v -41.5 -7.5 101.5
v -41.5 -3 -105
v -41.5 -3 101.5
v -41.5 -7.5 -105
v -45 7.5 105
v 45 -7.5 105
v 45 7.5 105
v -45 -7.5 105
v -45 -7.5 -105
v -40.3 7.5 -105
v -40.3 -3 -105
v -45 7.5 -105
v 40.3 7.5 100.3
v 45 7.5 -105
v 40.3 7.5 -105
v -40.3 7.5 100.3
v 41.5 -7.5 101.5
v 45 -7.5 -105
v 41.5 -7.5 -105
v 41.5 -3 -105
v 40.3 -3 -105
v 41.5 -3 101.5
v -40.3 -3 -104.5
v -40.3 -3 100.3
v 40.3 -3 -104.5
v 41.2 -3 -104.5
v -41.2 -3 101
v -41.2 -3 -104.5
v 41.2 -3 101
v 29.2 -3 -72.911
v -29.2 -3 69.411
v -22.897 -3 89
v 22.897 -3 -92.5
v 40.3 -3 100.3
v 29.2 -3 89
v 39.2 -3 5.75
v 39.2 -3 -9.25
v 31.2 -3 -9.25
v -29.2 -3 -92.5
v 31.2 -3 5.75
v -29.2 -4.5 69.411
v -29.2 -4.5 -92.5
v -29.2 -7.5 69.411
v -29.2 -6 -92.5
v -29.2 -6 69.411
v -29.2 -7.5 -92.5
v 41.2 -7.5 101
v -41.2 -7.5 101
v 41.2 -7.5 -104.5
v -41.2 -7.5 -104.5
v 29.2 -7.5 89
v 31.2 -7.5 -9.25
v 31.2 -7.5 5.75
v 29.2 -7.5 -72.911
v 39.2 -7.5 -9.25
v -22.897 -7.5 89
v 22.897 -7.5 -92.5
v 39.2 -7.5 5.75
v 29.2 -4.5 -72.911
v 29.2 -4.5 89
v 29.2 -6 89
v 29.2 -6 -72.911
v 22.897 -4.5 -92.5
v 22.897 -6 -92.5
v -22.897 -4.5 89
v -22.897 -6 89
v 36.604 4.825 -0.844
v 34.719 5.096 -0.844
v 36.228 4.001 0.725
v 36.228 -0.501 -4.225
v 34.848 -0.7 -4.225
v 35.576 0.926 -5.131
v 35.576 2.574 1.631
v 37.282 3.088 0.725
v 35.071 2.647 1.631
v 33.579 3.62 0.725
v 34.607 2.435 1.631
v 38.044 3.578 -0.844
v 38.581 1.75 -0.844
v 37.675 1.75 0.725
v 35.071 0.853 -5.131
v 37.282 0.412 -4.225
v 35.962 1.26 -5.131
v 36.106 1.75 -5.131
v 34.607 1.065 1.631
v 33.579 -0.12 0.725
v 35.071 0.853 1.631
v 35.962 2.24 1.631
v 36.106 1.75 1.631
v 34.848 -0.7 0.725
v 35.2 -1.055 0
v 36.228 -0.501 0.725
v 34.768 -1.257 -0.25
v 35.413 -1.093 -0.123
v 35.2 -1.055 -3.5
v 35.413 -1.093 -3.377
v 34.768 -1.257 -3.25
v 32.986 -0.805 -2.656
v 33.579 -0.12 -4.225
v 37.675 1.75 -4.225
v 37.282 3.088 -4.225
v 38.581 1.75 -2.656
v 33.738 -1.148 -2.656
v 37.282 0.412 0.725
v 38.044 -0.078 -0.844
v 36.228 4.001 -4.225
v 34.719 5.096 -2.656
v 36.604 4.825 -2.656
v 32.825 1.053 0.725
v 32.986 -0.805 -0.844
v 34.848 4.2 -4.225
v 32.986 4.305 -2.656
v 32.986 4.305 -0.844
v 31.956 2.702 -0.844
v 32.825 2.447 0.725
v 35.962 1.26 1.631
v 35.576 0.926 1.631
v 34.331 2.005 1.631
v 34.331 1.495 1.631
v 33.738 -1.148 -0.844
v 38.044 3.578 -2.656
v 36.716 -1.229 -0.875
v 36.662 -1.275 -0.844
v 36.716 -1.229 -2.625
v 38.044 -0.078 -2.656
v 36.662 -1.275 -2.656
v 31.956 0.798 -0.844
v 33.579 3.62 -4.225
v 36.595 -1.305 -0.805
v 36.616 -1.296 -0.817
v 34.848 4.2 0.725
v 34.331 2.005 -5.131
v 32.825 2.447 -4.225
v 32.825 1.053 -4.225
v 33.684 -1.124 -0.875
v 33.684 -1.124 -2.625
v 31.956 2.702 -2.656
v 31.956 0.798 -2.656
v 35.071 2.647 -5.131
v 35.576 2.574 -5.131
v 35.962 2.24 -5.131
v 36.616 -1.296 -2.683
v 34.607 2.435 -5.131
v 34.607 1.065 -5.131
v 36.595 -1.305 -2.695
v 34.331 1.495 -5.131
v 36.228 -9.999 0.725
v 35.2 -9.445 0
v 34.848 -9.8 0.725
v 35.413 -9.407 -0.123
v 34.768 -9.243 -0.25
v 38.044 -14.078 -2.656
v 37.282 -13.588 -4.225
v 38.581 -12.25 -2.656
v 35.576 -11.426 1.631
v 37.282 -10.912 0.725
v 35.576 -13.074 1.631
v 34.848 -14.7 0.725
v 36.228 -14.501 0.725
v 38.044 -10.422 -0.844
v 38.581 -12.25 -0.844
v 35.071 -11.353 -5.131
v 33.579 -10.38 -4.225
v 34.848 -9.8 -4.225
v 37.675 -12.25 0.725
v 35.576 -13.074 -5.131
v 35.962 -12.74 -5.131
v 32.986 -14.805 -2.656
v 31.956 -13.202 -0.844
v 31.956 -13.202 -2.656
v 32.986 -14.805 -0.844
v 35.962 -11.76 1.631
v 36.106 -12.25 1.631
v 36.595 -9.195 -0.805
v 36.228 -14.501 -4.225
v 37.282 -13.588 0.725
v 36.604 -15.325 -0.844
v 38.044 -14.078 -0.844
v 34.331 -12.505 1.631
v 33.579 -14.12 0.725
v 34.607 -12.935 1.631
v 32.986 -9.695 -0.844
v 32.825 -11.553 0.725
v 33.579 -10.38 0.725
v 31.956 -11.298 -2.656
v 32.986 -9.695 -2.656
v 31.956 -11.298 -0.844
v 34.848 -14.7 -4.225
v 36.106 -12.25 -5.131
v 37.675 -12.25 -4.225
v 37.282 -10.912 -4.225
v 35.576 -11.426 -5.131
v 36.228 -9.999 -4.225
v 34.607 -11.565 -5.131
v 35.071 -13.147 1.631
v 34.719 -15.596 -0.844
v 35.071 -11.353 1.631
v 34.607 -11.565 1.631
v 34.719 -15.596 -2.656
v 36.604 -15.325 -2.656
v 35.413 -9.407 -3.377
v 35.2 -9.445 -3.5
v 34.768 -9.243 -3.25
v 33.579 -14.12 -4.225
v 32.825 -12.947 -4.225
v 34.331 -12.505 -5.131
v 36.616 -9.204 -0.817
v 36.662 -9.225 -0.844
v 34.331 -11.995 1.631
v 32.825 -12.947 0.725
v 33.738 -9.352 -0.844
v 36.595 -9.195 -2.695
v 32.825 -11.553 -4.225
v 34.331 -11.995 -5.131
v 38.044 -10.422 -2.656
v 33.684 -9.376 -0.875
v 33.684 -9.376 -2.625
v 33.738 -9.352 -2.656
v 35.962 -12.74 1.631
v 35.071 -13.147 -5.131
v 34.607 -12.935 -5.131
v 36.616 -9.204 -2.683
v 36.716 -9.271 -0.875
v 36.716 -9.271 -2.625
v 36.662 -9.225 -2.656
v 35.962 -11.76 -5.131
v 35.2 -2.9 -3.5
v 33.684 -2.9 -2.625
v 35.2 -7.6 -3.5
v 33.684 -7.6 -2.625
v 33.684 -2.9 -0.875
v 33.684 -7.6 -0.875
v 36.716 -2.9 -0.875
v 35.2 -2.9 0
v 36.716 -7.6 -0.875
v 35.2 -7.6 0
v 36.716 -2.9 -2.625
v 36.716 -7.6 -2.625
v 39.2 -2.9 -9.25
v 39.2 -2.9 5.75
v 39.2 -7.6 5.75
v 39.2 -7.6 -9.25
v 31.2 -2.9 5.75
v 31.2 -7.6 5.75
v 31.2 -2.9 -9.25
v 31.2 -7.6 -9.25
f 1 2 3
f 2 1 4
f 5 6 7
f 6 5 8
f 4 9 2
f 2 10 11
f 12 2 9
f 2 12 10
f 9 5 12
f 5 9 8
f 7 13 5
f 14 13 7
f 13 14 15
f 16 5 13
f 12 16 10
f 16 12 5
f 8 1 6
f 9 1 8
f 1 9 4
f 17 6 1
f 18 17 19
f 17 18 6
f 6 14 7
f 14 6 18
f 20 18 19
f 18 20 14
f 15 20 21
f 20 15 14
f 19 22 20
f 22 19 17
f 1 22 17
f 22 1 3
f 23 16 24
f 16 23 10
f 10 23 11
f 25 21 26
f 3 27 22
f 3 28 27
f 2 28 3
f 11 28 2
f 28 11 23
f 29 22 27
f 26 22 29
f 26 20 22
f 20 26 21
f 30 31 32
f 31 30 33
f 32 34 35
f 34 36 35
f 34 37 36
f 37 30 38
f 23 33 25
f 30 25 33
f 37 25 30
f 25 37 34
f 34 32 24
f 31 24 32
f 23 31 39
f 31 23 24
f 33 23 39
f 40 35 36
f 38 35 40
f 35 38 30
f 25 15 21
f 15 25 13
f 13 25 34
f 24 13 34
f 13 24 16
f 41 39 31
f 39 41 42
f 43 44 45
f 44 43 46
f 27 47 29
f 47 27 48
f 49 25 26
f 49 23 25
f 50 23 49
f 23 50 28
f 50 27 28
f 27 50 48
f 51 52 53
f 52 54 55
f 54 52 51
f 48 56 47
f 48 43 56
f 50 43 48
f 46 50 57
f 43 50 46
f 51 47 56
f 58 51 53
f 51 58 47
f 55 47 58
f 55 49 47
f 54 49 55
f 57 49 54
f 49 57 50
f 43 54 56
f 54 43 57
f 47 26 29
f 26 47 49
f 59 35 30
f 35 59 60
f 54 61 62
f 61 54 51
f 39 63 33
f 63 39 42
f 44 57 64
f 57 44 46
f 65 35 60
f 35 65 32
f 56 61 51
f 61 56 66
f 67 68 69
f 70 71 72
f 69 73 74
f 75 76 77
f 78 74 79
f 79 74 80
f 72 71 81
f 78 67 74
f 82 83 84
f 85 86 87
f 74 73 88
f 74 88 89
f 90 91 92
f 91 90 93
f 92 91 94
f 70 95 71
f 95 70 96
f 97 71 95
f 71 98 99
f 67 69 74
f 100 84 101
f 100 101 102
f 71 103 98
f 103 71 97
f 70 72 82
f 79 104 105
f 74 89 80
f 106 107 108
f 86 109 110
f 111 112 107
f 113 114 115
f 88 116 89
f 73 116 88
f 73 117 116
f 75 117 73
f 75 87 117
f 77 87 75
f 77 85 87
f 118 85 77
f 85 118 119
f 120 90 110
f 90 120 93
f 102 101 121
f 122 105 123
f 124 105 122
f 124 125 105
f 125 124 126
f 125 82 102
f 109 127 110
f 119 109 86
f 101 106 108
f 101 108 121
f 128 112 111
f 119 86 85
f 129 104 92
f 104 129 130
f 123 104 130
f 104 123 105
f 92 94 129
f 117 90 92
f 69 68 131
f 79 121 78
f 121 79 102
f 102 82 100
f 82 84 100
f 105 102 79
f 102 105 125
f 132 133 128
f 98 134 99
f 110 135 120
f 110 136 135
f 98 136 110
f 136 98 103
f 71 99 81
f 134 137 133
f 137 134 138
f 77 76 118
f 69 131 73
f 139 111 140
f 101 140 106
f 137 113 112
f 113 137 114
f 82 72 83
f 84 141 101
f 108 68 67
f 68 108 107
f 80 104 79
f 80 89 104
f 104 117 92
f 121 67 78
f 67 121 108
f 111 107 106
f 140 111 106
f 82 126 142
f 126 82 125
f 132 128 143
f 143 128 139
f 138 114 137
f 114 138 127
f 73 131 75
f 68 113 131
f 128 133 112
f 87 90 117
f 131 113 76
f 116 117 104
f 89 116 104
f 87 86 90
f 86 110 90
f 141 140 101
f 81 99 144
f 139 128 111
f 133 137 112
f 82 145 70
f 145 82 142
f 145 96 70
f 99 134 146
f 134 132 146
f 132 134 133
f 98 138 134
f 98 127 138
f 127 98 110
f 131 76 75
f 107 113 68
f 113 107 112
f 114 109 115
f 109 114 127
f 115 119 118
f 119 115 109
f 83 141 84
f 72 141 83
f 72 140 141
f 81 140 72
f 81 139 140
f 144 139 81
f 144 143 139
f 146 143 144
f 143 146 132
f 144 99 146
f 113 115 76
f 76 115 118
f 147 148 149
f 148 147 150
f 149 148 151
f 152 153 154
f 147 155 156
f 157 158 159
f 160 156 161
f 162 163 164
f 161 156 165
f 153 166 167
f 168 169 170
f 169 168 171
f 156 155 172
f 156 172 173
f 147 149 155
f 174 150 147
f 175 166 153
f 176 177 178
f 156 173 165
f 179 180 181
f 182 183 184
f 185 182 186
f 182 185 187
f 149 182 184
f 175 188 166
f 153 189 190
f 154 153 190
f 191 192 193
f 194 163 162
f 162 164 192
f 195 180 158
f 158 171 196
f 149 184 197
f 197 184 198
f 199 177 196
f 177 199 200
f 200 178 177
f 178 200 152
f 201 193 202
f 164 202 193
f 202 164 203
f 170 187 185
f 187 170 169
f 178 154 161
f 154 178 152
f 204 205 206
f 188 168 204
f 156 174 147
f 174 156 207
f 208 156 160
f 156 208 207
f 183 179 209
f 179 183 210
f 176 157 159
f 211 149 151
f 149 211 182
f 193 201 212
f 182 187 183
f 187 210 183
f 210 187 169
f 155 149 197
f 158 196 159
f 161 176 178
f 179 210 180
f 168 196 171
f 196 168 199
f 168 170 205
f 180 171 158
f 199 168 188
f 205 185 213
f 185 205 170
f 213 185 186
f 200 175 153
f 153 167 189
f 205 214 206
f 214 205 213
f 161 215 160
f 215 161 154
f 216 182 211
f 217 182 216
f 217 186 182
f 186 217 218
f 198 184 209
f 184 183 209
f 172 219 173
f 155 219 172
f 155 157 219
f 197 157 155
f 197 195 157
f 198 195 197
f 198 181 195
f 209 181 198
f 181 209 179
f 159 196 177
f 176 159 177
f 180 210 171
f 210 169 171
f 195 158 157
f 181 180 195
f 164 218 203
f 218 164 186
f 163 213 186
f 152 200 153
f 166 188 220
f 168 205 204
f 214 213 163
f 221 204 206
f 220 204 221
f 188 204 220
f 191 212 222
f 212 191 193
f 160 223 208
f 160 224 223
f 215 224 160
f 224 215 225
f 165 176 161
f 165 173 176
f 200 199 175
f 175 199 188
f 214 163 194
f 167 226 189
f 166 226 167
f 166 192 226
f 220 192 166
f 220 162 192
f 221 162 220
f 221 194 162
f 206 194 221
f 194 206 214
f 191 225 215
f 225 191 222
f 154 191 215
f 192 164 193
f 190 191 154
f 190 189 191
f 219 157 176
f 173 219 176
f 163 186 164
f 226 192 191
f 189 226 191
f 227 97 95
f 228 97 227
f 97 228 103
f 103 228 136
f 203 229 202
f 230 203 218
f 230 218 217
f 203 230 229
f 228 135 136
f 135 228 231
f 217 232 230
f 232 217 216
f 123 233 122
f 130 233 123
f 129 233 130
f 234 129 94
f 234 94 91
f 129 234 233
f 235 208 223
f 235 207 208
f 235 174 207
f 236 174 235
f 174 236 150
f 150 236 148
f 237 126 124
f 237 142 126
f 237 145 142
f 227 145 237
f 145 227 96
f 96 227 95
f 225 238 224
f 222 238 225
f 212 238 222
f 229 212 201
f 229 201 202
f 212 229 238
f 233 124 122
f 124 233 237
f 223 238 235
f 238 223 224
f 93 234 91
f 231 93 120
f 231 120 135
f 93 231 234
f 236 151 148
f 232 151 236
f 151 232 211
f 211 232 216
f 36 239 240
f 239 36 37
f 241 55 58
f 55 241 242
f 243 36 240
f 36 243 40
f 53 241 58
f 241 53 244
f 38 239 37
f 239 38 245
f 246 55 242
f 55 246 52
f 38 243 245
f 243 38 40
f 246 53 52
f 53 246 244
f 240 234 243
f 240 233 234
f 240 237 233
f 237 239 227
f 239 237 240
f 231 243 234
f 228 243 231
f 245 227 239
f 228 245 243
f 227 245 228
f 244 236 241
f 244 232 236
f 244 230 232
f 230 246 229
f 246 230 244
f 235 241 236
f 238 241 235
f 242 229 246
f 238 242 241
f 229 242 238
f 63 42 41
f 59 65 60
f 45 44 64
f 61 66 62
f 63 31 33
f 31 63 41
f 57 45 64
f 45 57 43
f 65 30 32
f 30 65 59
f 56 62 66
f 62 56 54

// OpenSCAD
module basicdoor(width=90, height=210, wall_thickness=15, right_handed = true) 
{
    open_angle = 00;
    
    profile_width = 12;
    door_thickness = 4.5;
    frame_profile_width = 3.5;
    frame_profile_depth = wall_thickness;
    seal_profile_width = 1.2;
    
    /* Outer frame fixed to convrete wall. */
    color([0.3,0.0,0.1])
    basicdoorframe(false, width, height, frame_profile_width, frame_profile_depth);

    color([0.4,0.2,0.2])
    translate([0, door_thickness/2,-frame_profile_width/2])
    basicdoorframe(false, width - 2 * frame_profile_width,
        height - frame_profile_width, 
        seal_profile_width, frame_profile_depth - door_thickness);
    
    /* Calculate door size. */
    open_w = width - 2 * frame_profile_width - 0.6;
    open_h = height - frame_profile_width - 1.0;

    ow = open_w/2 + 0.2;
    translate([right_handed?-ow:ow, 
        -(frame_profile_depth-door_thickness)/2, -frame_profile_width/2])
    rotate([0, 0, right_handed?-open_angle:open_angle])
    translate([right_handed?ow:-ow, 0, 0])
     union() {
        /* Playwood */
        color([0.2,0.0,0.1])
        cube([open_w, 1.5, open_h], center=true);
        
        /* Door strengtehing. */
        color([0.5,0.2,0.2])
        basicdoorframe(true, open_w, open_h, profile_width, door_thickness);
        
         /* Diagonal strengthening */
        dx = open_w - 2*profile_width;
        dy = open_h - 2*profile_width;
        l = sqrt(dx*dx+dy*dy);
        rotate([0,-atan2(dx,dy), 0])
        color([0.5,0.2,0.2])
        cube([profile_width, door_thickness, l], center=true);
         
         /* Door knob */
         translate([open_w/2 - 6.0, 0, 0])
         color([218/255,172/255,96/255])
         doorknob(door_thickness);
    }
}

module basicdoorframe(draw_bottom=true,width=70, height=110, profile_width = 5, door_thickness = 8) 
{
    translate([-(width - profile_width)/2, 0, 0]) 
    cube([profile_width,door_thickness, height], center=true);
    
    translate([(width - profile_width)/2, 0, 0]) 
    cube([profile_width,door_thickness, height], center=true);

    if (draw_bottom) {
        translate([0, 0, -(height - profile_width)/2]) 
        cube([width, door_thickness, profile_width], center=true);
    }
    
    translate([0, 0, (height - profile_width)/2]) 
    cube([width, door_thickness, profile_width], center=true);
}    

module doorknob(door_thickness = 8)
{
    doorknob_length = 7;
    doorknob_r = 3.5;
    
    translate([0, doorknob_length, 0]) 
    sphere(r=doorknob_r);
    translate([0, -doorknob_length, 0]) 
    sphere(r=doorknob_r);
 
    rotate([90, 90, 0])
    cylinder(h = doorknob_length*2, r = 0.5 * doorknob_r, center=true);
   
    cube([8, door_thickness+0.2, 15],center=true); 
}

// For testing
basicdoor();
